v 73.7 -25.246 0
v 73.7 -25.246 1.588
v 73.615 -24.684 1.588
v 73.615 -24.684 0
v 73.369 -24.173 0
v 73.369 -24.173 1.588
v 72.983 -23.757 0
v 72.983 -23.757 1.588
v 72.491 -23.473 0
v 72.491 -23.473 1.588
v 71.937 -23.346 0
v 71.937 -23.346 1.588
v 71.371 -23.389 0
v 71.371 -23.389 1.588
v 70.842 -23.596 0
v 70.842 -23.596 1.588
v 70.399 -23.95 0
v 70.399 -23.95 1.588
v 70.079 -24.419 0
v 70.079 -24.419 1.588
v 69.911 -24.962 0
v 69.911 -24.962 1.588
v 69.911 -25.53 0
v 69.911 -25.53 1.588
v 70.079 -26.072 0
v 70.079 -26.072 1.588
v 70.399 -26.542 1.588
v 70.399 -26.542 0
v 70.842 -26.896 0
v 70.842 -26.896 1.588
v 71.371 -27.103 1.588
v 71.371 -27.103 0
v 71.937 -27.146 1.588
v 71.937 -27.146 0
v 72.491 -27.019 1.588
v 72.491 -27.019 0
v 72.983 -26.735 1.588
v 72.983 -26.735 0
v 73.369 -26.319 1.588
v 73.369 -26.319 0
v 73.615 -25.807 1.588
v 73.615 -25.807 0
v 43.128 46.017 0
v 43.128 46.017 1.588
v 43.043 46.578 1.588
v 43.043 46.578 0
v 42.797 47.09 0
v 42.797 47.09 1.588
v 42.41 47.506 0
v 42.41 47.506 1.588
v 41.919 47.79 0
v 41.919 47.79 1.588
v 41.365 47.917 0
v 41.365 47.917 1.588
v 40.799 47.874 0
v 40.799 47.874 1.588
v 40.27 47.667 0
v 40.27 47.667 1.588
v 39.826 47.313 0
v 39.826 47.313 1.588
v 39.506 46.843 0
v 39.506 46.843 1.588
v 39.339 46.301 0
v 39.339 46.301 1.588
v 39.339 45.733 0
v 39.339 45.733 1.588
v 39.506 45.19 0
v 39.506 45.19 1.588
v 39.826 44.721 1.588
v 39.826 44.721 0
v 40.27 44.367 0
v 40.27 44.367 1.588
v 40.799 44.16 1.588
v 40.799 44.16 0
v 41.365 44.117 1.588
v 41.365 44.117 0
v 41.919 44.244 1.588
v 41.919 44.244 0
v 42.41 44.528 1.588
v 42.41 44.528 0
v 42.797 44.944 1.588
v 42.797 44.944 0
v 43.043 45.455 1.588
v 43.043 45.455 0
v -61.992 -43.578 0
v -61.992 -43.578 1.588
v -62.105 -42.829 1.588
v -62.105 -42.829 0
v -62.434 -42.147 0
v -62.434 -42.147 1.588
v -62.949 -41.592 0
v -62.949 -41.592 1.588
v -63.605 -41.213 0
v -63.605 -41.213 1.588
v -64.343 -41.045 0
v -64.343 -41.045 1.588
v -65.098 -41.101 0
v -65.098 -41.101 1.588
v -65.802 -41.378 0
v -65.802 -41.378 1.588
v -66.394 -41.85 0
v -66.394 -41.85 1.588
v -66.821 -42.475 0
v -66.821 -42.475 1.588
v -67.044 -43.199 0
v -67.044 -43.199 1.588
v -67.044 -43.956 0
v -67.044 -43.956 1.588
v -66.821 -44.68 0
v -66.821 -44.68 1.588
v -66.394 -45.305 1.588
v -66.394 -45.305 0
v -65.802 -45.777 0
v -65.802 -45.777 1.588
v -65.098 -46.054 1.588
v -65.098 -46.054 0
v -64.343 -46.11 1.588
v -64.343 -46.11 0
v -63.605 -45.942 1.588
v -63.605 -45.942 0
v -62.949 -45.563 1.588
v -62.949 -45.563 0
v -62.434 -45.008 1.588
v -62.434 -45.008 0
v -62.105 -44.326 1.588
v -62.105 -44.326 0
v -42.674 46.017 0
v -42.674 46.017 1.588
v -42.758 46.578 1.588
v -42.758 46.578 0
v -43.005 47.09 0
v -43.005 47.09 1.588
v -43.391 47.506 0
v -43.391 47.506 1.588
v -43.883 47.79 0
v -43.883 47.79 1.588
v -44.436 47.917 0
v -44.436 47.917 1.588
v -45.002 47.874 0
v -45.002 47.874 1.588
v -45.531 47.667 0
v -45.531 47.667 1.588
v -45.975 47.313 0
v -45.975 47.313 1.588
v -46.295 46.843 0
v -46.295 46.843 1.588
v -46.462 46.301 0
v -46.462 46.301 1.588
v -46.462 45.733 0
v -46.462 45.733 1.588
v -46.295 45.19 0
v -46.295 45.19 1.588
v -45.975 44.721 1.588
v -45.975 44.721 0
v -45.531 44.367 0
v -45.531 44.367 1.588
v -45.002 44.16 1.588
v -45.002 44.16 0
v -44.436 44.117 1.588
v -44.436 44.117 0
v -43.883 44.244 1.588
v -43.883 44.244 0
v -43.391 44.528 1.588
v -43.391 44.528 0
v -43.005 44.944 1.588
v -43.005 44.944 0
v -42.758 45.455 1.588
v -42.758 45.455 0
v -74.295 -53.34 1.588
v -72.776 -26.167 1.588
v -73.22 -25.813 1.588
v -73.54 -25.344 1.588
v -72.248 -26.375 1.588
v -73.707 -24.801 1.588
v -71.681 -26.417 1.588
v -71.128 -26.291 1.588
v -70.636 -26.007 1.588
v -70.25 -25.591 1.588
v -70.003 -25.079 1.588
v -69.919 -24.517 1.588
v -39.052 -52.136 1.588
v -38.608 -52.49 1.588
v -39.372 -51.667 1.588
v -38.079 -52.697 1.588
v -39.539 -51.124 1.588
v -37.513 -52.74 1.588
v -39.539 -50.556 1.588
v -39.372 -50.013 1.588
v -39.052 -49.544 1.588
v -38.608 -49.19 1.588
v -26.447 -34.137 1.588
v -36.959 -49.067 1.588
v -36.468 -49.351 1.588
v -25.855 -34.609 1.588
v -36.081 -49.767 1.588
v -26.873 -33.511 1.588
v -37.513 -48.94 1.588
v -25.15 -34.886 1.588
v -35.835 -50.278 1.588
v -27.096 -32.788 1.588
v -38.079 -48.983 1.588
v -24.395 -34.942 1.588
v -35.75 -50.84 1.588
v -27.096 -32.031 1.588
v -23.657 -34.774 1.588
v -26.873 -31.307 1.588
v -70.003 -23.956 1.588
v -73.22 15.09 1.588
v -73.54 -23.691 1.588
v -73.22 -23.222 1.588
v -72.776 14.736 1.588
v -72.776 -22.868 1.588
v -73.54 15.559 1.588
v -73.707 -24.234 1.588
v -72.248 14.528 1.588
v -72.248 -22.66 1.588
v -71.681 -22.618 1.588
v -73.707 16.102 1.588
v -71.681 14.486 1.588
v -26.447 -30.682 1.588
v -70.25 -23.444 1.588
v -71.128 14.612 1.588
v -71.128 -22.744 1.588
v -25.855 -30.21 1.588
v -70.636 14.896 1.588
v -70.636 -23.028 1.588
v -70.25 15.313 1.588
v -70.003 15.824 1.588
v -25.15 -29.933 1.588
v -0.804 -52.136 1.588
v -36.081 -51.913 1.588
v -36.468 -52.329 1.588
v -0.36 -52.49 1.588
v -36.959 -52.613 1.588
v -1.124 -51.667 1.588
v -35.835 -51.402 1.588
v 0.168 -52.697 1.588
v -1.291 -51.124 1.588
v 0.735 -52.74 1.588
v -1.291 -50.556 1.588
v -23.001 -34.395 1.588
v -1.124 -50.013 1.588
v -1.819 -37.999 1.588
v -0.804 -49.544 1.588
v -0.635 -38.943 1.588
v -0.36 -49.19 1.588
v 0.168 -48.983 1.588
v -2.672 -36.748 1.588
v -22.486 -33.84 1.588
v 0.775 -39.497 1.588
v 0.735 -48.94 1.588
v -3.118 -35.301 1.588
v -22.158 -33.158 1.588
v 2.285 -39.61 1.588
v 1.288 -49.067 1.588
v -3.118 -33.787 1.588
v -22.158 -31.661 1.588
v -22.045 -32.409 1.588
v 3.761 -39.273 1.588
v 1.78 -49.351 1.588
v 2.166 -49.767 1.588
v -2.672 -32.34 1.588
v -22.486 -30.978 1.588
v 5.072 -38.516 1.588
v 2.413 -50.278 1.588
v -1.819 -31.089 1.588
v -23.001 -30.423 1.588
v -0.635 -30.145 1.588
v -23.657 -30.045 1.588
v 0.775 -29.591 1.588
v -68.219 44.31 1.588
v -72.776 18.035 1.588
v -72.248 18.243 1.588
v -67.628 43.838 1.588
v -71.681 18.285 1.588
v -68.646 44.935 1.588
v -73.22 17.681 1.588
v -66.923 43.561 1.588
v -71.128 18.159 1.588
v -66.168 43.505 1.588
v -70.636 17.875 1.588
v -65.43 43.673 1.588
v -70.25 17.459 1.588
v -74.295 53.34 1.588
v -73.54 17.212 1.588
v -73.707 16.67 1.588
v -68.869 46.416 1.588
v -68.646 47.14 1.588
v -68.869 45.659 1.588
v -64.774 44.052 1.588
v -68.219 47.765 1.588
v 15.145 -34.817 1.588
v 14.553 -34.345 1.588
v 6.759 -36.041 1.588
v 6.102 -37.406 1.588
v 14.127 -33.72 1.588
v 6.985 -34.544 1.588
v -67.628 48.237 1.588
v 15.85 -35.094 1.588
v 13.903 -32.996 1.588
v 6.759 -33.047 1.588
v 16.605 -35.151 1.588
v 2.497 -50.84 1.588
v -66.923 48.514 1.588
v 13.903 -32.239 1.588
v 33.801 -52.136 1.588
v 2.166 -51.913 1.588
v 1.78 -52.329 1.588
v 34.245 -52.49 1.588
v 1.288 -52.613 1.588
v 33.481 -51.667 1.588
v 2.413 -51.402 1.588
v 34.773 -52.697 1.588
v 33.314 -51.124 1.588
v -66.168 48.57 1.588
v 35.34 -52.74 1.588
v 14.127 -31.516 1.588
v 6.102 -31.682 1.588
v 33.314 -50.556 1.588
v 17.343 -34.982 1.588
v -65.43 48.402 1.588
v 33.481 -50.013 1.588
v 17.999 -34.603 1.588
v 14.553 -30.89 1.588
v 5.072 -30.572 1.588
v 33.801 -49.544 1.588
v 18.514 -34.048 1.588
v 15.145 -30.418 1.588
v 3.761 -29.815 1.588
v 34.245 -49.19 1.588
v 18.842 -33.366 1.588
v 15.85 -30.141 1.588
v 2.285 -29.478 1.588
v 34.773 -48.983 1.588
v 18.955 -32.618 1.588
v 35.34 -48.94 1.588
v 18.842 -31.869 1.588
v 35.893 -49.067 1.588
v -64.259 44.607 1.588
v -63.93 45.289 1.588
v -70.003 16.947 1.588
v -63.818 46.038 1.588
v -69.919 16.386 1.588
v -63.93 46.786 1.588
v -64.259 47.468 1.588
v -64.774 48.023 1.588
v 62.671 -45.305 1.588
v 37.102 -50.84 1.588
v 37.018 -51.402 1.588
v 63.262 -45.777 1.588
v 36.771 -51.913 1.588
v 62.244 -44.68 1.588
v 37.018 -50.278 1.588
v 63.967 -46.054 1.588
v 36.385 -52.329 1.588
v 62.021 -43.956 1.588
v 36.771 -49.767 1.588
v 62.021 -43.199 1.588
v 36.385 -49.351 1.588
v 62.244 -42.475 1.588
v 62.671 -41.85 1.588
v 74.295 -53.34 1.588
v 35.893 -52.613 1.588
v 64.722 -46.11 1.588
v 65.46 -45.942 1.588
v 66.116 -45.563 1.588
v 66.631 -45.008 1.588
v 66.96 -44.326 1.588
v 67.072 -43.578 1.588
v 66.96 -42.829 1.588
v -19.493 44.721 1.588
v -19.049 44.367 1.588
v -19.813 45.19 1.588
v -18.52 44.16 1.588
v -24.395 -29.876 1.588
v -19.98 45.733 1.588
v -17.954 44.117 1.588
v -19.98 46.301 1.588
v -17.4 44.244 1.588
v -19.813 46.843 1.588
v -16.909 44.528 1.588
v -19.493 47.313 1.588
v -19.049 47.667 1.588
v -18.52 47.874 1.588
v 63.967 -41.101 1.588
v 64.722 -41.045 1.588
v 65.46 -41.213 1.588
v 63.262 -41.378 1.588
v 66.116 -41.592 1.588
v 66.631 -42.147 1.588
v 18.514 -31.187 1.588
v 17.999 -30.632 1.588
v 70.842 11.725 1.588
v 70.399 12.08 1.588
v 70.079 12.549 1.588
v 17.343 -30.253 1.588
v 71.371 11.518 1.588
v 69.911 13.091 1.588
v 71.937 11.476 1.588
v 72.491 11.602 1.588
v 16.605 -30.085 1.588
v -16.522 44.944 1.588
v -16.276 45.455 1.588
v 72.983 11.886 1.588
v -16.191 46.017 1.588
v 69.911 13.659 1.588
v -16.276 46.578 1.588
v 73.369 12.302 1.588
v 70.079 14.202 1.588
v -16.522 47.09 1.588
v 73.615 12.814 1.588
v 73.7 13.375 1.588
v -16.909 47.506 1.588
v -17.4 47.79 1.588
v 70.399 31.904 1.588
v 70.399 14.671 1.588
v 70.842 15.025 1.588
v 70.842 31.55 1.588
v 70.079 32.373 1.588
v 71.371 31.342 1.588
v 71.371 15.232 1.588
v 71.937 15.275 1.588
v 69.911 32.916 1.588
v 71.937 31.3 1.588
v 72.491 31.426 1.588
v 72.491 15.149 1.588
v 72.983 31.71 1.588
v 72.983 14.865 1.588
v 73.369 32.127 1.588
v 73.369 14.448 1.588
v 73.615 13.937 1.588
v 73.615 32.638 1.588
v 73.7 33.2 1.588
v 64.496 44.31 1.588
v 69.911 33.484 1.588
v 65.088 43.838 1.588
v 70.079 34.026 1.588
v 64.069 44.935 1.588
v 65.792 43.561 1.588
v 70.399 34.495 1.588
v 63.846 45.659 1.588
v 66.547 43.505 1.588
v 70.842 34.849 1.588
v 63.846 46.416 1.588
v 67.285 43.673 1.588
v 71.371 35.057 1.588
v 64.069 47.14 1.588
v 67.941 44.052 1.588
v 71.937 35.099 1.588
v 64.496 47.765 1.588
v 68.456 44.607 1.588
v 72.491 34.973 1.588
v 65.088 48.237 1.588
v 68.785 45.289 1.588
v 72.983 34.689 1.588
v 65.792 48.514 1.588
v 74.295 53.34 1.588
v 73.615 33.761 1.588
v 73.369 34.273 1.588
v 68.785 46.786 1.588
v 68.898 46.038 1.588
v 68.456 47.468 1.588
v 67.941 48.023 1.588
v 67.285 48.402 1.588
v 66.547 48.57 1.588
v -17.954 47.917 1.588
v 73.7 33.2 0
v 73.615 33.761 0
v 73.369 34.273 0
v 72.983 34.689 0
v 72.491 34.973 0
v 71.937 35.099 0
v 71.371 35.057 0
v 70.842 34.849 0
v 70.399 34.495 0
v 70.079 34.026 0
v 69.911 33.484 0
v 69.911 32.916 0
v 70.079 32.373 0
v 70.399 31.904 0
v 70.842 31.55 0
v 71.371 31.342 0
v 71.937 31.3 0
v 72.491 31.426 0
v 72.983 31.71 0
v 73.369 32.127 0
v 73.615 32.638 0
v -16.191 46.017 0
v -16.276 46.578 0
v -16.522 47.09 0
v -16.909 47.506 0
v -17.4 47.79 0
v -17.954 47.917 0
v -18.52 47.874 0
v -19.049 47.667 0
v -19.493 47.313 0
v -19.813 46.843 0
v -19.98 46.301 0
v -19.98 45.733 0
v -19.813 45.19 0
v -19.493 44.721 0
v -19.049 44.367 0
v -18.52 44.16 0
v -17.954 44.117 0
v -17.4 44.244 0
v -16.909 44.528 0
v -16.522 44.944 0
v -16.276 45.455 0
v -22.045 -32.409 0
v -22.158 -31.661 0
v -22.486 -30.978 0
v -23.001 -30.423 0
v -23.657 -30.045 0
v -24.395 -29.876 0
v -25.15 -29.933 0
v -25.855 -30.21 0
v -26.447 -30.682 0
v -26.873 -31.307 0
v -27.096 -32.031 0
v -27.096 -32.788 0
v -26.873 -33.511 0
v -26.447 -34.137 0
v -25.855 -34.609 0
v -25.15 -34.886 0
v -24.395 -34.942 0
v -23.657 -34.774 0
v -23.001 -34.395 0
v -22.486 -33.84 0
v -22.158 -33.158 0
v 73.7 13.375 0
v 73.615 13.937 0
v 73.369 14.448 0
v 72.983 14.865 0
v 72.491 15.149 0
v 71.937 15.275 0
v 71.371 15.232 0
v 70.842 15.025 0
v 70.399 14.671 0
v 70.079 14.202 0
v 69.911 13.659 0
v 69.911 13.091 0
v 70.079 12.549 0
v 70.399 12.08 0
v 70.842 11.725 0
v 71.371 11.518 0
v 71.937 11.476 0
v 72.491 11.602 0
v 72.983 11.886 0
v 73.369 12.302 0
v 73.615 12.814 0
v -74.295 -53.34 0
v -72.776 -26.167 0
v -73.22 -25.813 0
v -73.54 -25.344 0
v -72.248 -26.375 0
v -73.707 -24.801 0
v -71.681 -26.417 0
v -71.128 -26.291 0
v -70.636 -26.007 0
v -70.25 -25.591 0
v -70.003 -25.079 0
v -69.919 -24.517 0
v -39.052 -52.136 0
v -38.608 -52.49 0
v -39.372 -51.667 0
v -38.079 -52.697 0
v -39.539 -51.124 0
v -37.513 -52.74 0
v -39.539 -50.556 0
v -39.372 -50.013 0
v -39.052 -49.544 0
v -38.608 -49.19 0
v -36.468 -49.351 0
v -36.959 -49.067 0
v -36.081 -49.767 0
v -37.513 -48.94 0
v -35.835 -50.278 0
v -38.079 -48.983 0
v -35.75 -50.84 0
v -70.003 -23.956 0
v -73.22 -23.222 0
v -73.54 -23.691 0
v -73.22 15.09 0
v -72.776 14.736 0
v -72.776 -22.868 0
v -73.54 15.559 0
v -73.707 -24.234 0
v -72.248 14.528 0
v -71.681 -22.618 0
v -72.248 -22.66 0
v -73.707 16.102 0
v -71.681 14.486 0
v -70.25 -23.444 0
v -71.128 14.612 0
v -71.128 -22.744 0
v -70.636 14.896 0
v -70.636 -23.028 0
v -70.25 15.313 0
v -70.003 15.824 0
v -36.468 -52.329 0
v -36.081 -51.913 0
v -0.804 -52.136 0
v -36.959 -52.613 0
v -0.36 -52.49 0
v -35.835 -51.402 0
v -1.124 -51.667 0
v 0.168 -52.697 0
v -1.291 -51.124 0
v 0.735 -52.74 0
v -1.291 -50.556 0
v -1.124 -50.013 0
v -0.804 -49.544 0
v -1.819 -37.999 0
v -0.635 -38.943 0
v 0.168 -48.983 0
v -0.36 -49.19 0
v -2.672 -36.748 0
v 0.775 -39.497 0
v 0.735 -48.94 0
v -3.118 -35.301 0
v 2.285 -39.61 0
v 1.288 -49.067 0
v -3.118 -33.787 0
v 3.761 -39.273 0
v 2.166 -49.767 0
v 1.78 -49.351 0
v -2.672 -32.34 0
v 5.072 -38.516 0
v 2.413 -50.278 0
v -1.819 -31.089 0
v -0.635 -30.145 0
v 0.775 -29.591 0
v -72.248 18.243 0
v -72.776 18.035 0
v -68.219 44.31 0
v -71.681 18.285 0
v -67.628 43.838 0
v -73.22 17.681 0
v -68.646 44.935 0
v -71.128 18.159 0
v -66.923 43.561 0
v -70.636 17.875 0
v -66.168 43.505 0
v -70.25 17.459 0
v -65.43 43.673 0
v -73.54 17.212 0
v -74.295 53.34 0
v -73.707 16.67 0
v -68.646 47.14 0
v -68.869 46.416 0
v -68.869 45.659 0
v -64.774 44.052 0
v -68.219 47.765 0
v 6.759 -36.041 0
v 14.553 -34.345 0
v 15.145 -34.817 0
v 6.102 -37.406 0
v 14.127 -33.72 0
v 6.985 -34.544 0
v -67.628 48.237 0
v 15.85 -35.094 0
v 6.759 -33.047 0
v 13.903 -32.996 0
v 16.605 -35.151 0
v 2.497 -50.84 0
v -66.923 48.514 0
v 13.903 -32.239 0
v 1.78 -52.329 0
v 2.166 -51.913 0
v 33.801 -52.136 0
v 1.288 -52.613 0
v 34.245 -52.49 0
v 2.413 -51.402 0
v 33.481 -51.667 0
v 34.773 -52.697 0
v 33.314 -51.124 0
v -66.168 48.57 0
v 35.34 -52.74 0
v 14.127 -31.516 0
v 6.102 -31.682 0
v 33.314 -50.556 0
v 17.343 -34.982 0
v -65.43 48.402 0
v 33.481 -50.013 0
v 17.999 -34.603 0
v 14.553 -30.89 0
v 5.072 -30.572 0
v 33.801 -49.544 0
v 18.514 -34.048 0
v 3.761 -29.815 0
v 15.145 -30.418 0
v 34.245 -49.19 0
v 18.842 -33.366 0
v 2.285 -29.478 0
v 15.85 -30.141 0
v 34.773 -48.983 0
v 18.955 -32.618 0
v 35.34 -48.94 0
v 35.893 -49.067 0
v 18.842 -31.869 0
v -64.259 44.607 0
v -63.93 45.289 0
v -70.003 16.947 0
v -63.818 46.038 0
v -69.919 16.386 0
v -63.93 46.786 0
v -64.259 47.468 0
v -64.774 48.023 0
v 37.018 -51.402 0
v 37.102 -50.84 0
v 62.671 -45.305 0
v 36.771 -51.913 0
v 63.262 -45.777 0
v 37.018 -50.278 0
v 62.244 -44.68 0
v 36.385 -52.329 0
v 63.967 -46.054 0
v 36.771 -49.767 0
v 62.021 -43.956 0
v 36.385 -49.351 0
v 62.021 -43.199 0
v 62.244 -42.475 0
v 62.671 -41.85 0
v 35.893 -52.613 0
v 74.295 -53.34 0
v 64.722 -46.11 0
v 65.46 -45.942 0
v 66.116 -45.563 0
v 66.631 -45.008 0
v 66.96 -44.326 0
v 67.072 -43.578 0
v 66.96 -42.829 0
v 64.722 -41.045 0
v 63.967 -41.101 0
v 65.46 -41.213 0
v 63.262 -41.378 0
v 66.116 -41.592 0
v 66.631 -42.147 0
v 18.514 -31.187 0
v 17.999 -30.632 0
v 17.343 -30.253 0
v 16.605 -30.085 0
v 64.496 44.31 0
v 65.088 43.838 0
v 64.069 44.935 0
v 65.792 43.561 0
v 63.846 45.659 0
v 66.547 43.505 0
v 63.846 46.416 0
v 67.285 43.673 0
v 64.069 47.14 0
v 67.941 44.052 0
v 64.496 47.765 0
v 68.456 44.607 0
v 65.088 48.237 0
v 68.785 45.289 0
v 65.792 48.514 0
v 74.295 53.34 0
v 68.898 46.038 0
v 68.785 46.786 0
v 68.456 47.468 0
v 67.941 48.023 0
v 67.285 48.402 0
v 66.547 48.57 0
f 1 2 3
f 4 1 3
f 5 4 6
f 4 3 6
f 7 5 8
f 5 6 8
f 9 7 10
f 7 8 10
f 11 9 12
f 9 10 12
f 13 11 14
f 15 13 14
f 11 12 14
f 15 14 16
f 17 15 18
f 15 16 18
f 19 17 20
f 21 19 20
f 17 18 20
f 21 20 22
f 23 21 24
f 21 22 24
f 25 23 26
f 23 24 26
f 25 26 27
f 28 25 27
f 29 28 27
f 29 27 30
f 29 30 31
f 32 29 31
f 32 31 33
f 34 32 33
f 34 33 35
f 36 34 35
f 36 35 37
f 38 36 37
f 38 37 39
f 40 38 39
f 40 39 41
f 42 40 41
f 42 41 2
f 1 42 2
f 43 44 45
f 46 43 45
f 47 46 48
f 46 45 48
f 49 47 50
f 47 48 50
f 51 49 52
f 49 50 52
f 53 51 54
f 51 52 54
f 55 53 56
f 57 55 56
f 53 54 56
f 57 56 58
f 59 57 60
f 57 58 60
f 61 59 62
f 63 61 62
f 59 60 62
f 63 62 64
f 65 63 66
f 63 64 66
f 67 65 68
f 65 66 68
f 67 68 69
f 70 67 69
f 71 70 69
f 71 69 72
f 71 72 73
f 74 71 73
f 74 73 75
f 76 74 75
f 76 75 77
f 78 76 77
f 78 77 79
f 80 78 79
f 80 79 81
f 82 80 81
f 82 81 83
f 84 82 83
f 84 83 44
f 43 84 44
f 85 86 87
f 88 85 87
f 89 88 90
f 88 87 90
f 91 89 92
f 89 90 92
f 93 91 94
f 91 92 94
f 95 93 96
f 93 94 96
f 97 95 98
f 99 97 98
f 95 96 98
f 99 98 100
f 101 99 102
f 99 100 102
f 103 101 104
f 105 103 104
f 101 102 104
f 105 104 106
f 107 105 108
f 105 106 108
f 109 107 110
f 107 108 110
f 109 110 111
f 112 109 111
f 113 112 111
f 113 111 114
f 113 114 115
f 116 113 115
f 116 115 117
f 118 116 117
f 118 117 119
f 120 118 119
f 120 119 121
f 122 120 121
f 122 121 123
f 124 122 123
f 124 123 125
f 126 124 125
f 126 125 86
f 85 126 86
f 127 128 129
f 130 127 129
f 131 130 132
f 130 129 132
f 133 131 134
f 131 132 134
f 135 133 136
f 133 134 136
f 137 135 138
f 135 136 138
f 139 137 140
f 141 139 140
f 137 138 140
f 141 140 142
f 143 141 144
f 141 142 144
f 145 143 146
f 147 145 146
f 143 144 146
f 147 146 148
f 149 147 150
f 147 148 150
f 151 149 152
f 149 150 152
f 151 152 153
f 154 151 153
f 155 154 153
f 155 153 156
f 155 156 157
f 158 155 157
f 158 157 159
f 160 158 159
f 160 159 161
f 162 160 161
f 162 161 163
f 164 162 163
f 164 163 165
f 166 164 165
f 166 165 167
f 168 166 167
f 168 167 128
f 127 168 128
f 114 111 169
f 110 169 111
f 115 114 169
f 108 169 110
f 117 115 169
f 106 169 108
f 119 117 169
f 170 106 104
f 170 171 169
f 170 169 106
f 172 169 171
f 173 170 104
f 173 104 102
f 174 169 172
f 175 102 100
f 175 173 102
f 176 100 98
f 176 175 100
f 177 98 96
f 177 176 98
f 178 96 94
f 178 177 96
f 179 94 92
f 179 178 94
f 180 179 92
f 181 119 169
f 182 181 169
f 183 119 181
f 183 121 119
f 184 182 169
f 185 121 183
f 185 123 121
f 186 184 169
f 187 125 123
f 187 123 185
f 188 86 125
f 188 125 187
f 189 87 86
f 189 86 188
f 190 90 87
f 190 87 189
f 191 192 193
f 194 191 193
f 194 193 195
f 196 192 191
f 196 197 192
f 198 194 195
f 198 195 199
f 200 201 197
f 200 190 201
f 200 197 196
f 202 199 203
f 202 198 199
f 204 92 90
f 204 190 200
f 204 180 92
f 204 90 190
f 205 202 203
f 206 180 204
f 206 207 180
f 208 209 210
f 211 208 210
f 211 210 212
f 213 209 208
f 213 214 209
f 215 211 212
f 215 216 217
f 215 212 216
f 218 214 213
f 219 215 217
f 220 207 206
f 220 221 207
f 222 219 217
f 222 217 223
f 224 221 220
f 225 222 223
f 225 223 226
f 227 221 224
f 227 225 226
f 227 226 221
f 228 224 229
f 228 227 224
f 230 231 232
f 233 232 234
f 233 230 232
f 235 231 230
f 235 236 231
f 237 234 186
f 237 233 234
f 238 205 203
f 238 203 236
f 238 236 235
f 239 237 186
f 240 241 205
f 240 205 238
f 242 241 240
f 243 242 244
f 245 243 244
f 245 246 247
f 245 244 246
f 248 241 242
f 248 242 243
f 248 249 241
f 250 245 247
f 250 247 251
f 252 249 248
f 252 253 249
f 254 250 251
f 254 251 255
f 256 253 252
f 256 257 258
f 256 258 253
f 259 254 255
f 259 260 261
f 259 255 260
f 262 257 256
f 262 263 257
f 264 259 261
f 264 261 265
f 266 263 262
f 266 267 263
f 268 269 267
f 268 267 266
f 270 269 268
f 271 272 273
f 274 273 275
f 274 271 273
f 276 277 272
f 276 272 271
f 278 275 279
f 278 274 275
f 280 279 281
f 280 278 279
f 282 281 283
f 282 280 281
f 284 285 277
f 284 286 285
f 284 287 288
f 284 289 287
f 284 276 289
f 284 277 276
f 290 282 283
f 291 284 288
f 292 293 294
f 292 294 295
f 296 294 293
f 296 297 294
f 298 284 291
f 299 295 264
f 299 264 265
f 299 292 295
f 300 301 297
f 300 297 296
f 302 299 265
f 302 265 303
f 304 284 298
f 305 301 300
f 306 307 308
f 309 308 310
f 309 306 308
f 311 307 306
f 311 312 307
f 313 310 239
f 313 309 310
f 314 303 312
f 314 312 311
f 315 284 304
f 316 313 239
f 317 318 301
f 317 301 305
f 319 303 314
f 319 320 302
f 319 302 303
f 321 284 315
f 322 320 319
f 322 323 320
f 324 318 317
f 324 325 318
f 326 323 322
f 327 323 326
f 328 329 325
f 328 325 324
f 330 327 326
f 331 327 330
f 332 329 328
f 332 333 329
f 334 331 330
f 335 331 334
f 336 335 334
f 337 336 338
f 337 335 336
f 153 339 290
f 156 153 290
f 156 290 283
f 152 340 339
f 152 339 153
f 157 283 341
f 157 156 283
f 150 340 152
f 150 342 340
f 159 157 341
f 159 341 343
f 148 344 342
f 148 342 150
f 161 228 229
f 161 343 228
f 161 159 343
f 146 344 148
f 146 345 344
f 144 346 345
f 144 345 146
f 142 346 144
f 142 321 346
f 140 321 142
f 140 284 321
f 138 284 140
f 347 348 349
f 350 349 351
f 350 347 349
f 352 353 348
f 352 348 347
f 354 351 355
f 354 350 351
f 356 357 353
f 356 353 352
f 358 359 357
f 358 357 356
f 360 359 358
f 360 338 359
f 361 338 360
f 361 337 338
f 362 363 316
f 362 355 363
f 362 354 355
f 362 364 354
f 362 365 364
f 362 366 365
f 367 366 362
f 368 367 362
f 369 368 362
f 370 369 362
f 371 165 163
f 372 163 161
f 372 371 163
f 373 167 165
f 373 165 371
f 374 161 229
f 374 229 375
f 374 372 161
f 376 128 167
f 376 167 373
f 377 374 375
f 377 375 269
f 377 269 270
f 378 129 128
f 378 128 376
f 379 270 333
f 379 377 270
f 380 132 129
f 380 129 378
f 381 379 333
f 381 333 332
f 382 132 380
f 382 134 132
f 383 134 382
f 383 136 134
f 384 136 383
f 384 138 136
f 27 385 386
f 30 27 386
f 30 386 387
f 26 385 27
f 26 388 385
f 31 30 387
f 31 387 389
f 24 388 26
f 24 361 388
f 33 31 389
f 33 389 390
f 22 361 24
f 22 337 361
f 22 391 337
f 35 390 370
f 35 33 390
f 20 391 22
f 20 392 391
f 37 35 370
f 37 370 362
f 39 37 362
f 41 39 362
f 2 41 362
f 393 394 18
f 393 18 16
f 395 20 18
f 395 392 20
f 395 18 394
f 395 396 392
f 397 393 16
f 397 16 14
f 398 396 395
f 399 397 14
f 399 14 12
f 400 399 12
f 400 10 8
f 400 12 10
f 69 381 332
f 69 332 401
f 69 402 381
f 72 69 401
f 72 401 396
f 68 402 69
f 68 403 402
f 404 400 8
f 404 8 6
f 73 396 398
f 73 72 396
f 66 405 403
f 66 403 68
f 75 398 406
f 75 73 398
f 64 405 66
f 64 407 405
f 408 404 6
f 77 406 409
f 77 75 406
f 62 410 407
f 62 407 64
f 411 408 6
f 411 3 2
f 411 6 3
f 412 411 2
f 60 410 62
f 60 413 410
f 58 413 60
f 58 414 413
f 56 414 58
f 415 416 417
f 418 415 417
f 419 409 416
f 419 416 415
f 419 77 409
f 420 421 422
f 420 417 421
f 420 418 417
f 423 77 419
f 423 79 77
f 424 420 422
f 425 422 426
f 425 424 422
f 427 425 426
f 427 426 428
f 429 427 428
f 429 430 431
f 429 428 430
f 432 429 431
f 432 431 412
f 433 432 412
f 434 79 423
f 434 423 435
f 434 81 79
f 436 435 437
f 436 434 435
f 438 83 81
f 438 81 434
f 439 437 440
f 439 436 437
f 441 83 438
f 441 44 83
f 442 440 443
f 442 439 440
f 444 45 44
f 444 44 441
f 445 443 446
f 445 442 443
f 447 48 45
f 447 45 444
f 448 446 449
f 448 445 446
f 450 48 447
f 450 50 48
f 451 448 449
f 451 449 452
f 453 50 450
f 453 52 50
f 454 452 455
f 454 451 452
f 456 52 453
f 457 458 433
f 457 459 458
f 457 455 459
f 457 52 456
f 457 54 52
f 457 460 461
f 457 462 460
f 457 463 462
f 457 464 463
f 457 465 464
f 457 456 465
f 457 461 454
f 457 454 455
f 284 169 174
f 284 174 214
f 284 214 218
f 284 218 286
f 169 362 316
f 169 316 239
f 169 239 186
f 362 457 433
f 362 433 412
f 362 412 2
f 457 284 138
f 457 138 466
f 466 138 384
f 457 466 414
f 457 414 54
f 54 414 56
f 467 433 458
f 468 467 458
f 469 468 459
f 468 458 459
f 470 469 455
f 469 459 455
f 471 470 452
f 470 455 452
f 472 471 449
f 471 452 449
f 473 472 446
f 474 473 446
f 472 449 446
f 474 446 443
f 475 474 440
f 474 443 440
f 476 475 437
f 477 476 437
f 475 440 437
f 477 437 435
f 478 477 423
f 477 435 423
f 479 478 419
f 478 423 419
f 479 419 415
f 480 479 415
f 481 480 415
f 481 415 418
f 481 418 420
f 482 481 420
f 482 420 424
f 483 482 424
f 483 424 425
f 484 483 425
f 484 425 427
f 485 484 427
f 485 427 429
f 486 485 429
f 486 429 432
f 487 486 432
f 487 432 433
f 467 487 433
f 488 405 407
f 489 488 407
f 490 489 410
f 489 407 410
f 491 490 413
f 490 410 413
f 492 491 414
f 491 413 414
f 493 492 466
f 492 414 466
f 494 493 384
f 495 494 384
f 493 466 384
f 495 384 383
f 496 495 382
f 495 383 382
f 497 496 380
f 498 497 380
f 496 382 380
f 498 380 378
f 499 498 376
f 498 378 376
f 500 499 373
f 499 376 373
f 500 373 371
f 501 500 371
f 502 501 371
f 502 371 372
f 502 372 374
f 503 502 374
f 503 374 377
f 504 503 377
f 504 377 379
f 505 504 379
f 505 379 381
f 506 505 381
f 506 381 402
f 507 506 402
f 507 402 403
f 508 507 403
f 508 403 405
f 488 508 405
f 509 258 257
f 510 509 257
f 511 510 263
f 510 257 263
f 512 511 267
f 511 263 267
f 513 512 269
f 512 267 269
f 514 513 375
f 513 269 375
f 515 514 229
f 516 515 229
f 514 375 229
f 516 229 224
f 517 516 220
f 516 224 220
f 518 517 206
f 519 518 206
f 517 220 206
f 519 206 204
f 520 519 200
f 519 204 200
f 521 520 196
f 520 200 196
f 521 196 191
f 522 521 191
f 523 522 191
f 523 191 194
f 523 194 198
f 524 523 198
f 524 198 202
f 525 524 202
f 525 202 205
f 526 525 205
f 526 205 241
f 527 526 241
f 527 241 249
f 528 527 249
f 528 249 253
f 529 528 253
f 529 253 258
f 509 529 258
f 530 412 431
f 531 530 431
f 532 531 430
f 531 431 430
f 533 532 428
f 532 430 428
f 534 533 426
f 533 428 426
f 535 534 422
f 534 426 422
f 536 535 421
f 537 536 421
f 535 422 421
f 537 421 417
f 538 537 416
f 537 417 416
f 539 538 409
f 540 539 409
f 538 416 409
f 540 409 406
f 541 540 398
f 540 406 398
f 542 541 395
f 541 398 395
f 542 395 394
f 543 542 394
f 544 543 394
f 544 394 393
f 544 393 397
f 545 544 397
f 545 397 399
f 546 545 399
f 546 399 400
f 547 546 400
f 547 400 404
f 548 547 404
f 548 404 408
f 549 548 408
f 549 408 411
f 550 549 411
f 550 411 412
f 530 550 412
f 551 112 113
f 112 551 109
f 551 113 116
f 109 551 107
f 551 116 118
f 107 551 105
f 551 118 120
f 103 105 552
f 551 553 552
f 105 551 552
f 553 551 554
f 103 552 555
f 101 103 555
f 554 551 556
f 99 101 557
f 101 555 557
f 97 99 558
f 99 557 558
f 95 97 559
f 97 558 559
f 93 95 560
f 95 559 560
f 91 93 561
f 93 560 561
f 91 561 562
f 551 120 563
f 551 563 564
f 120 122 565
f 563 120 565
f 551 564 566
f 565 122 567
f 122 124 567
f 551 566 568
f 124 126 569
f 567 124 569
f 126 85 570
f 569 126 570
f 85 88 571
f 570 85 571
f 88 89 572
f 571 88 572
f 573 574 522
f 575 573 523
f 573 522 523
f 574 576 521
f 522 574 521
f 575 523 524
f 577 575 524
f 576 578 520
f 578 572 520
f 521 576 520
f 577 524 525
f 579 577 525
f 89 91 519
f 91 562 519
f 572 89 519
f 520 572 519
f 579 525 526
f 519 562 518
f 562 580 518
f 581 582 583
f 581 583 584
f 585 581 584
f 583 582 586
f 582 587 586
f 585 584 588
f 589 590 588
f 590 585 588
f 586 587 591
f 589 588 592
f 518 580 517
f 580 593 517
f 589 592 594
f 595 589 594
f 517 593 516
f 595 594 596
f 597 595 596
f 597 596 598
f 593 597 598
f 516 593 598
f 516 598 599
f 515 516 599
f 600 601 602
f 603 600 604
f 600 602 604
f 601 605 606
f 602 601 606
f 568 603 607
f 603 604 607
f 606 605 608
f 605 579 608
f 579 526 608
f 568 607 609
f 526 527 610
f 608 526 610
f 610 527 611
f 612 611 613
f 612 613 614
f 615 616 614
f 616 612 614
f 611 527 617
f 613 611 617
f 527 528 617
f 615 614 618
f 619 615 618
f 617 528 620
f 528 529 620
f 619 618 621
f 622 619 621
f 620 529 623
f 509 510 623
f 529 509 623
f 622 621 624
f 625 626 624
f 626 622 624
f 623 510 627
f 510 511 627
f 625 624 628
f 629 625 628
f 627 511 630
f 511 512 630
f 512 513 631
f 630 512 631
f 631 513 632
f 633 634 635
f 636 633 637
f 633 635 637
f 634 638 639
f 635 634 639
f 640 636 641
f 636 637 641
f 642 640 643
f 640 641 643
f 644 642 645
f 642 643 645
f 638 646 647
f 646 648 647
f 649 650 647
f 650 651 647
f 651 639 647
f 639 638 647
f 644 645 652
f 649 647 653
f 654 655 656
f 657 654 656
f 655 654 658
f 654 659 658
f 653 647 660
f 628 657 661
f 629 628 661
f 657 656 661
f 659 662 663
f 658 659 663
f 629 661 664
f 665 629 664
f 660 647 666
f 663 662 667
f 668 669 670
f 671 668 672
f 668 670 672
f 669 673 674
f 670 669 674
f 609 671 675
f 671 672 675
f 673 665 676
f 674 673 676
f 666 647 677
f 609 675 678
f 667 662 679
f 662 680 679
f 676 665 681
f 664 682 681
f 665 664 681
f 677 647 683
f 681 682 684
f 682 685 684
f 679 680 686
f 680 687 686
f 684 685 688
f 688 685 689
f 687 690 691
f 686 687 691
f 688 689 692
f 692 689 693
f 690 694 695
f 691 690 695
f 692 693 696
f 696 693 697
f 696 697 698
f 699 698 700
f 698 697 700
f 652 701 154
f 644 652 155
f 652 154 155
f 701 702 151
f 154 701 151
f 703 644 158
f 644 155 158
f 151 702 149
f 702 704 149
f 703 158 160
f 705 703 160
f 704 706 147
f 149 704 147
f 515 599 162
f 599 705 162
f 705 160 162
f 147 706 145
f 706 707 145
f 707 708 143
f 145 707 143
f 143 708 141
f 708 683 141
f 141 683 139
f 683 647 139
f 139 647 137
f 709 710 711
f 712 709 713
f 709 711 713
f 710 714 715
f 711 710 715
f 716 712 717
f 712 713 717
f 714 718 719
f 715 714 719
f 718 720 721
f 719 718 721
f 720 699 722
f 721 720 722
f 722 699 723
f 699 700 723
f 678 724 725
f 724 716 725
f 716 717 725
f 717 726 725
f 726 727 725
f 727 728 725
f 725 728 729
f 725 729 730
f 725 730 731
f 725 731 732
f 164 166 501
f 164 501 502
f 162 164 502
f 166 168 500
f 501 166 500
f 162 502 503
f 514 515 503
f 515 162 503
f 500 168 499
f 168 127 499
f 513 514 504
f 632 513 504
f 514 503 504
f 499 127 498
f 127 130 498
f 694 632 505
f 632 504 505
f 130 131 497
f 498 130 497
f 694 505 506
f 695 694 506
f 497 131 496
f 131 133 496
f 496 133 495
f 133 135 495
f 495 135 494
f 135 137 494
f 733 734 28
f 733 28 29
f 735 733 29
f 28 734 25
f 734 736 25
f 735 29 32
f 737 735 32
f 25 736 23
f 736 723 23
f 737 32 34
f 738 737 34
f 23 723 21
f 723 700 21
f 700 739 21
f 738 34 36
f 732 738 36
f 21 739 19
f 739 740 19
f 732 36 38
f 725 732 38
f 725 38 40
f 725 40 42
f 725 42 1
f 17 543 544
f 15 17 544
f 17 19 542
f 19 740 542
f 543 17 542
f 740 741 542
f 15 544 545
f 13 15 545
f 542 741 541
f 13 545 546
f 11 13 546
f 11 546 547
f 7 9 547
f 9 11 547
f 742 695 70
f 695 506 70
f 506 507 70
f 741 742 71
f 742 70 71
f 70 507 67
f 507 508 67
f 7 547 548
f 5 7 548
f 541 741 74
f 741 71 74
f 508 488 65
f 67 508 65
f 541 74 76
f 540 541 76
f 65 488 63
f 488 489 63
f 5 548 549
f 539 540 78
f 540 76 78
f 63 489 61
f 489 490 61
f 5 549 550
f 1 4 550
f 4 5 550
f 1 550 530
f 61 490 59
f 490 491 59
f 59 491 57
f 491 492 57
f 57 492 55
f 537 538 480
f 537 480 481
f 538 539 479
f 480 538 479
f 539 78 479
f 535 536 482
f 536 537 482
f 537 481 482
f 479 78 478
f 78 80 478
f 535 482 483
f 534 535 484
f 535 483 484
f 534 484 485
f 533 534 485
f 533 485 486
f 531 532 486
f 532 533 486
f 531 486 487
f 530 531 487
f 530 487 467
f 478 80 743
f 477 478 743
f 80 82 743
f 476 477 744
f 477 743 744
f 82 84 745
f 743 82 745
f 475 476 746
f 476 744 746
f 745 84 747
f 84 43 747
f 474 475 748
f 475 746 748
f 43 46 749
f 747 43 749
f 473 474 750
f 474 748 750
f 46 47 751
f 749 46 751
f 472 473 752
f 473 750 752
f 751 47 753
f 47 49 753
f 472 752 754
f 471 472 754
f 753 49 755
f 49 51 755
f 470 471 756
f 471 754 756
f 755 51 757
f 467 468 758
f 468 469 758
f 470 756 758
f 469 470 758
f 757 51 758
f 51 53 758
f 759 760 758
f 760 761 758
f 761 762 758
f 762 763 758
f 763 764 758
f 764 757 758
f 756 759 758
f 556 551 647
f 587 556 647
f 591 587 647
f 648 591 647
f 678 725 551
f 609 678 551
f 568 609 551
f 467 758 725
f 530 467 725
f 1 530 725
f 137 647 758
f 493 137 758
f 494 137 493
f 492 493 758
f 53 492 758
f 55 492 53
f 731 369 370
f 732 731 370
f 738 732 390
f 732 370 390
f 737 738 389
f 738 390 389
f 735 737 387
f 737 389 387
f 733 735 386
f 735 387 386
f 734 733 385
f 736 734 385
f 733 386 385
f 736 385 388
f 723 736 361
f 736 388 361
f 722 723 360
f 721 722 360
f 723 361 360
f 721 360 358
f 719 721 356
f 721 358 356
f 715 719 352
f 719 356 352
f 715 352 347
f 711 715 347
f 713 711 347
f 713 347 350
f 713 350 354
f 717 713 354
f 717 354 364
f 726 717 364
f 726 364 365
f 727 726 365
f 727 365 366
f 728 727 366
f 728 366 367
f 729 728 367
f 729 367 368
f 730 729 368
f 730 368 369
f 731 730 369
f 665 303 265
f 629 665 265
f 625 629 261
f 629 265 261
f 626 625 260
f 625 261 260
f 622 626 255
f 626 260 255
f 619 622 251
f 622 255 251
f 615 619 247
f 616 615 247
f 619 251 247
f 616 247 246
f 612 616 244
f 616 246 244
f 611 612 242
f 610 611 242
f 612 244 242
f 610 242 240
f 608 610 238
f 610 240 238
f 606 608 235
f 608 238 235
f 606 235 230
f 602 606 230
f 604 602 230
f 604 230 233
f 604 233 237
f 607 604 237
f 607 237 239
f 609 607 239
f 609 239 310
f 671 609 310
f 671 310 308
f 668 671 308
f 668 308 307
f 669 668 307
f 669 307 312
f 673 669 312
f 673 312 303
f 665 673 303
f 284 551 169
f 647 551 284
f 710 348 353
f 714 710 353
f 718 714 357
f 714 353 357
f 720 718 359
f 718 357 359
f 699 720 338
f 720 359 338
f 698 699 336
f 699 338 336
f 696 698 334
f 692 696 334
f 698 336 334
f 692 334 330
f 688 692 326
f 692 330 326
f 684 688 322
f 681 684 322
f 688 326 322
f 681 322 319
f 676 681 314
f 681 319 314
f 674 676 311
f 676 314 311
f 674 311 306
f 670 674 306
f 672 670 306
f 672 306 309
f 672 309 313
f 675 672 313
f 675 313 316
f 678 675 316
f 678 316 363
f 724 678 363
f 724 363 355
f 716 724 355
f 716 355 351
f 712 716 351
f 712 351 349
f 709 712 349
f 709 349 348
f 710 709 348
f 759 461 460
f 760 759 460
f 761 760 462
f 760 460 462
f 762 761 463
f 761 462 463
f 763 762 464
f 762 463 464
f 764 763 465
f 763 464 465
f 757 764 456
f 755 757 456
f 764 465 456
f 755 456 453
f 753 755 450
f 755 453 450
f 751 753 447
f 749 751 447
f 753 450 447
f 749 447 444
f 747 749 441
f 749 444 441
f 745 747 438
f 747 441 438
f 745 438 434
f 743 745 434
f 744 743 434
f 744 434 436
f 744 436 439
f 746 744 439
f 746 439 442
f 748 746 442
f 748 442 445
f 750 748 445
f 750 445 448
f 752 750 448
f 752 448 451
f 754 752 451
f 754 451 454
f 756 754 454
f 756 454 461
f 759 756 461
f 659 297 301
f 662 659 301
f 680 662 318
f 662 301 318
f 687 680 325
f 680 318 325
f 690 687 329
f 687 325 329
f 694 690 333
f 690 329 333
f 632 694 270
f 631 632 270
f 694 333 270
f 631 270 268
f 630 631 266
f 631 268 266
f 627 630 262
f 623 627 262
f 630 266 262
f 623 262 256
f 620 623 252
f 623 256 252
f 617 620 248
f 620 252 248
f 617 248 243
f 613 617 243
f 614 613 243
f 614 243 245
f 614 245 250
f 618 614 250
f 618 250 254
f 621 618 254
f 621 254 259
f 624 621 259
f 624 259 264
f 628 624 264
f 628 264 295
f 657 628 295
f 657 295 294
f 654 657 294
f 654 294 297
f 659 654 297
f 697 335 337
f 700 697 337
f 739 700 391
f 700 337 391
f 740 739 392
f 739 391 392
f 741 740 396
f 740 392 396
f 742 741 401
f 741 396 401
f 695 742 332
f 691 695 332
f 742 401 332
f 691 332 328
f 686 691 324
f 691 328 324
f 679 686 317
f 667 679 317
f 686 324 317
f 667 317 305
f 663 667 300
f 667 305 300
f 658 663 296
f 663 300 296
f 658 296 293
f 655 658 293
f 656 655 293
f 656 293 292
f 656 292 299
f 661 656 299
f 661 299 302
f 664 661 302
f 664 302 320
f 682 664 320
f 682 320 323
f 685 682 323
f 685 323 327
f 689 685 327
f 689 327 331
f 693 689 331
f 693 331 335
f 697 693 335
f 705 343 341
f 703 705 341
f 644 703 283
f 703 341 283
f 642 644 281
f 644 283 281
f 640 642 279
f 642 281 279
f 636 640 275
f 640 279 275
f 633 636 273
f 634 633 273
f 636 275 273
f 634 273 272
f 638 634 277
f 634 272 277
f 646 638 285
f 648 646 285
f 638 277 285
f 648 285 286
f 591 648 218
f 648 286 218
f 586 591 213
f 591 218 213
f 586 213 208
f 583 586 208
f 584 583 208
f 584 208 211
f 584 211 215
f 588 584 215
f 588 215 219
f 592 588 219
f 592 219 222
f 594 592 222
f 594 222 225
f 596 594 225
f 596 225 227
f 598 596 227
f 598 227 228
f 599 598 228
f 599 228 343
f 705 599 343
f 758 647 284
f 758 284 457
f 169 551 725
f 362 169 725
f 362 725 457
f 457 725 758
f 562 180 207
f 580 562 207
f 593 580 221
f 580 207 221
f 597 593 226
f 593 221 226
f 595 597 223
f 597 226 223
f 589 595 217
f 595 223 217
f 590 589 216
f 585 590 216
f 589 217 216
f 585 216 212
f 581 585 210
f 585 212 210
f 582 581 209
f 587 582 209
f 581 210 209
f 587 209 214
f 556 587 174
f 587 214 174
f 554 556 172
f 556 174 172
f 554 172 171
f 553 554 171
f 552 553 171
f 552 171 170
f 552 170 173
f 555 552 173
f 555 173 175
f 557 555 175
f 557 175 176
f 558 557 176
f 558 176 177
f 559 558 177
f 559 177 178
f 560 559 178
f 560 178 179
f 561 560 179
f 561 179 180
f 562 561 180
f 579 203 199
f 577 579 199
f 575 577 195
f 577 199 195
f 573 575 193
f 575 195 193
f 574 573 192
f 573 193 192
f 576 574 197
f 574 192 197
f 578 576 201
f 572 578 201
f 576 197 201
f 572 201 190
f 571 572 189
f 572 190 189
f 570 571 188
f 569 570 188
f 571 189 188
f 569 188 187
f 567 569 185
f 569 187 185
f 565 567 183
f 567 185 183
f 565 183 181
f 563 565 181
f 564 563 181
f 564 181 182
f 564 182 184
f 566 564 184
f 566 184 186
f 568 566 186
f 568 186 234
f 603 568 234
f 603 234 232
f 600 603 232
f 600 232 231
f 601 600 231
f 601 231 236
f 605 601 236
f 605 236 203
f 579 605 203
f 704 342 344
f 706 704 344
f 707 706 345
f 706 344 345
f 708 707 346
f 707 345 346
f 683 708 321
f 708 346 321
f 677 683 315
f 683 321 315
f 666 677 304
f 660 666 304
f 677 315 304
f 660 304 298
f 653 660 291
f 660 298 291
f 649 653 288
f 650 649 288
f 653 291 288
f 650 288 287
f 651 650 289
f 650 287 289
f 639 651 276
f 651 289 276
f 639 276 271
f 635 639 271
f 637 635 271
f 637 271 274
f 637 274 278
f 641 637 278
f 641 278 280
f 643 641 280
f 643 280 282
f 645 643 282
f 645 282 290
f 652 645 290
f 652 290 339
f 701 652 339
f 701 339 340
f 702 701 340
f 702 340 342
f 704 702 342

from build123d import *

# Parameters (mm, degrees)
SKETCH1_W           = 148.59
SKETCH1_H           = 106.68
BOSS_EXTRUDE1_DEPTH = 1.5875
SKETCH2_R           = 2.54
CUT_EXTRUDE1_DEPTH  = 2.5875
CUT_EXTRUDE2_REACH  = 3.587
SKETCH3_R           = 5.08
CUT_EXTRUDE3_REACH  = 3.587
SKETCH4_R           = 1.905
CUT_EXTRUDE4_REACH  = 3.587
SKETCH5_R           = 2.54


with BuildPart() as part:
    # Sketch1 → Boss-Extrude1 (new body)
    with BuildSketch(Plane.XY):
        Rectangle(SKETCH1_W, SKETCH1_H)
    extrude(amount=BOSS_EXTRUDE1_DEPTH)

    # Sketch2 → Cut-Extrude1 (cut, through all)
    with BuildSketch(Plane.XY.offset(1.5875)):
        with Locations((-64.5325, -43.5775)):
            Circle(SKETCH2_R)
        with Locations((64.5325, -43.5775)):
            Circle(SKETCH2_R)
        with Locations((-66.3575, 46.0375)):
            Circle(SKETCH2_R)
        with Locations((66.3575, 46.0375)):
            Circle(SKETCH2_R)
    extrude(amount=-CUT_EXTRUDE1_DEPTH, mode=Mode.SUBTRACT)

    # Sketch3 → Cut-Extrude2 (cut, up to next)
    with BuildSketch(Plane.XY.offset(1.5875), mode=Mode.PRIVATE) as cut_extrude2_sk1:
        with Locations((1.905, -34.544)):
            Circle(SKETCH3_R)
    cut_extrude2_tool1 = extrude(cut_extrude2_sk1.sketch, amount=-CUT_EXTRUDE2_REACH, mode=Mode.PRIVATE) & part.part
    add(cut_extrude2_tool1.solids().sort_by_distance((1.905, -34.544, 1.5875))[0], mode=Mode.SUBTRACT)

    # Sketch4 → Cut-Extrude3 (cut, up to next)
    with BuildSketch(Plane.XY.offset(1.5875), mode=Mode.PRIVATE) as cut_extrude3_sk1:
        with Locations((-44.578582342, 46.016934616)):
            Circle(SKETCH4_R)
    cut_extrude3_tool1 = extrude(cut_extrude3_sk1.sketch, amount=-CUT_EXTRUDE3_REACH, mode=Mode.PRIVATE) & part.part
    add(cut_extrude3_tool1.solids().sort_by_distance((-44.578582, 46.016935, 1.5875))[0], mode=Mode.SUBTRACT)
    # Sketch4 → Cut-Extrude3 (cut, up to next)
    with BuildSketch(Plane.XY.offset(1.5875), mode=Mode.PRIVATE) as cut_extrude3_sk2:
        with Locations((-18.096274256, 46.016934616)):
            Circle(SKETCH4_R)
    cut_extrude3_tool2 = extrude(cut_extrude3_sk2.sketch, amount=-CUT_EXTRUDE3_REACH, mode=Mode.PRIVATE) & part.part
    add(cut_extrude3_tool2.solids().sort_by_distance((-18.096274, 46.016935, 1.5875))[0], mode=Mode.SUBTRACT)
    # Sketch4 → Cut-Extrude3 (cut, up to next)
    with BuildSketch(Plane.XY.offset(1.5875), mode=Mode.PRIVATE) as cut_extrude3_sk3:
        with Locations((41.222617745, 46.016934616)):
            Circle(SKETCH4_R)
    cut_extrude3_tool3 = extrude(cut_extrude3_sk3.sketch, amount=-CUT_EXTRUDE3_REACH, mode=Mode.PRIVATE) & part.part
    add(cut_extrude3_tool3.solids().sort_by_distance((41.222618, 46.016935, 1.5875))[0], mode=Mode.SUBTRACT)
    # Sketch4 → Cut-Extrude3 (cut, up to next)
    with BuildSketch(Plane.XY.offset(1.5875), mode=Mode.PRIVATE) as cut_extrude3_sk4:
        with Locations((71.795, 33.199680415)):
            Circle(SKETCH4_R)
    cut_extrude3_tool4 = extrude(cut_extrude3_sk4.sketch, amount=-CUT_EXTRUDE3_REACH, mode=Mode.PRIVATE) & part.part
    add(cut_extrude3_tool4.solids().sort_by_distance((71.795, 33.19968, 1.5875))[0], mode=Mode.SUBTRACT)
    # Sketch4 → Cut-Extrude3 (cut, up to next)
    with BuildSketch(Plane.XY.offset(1.5875), mode=Mode.PRIVATE) as cut_extrude3_sk5:
        with Locations((71.795, 13.37524336)):
            Circle(SKETCH4_R)
    cut_extrude3_tool5 = extrude(cut_extrude3_sk5.sketch, amount=-CUT_EXTRUDE3_REACH, mode=Mode.PRIVATE) & part.part
    add(cut_extrude3_tool5.solids().sort_by_distance((71.795, 13.375243, 1.5875))[0], mode=Mode.SUBTRACT)
    # Sketch4 → Cut-Extrude3 (cut, up to next)
    with BuildSketch(Plane.XY.offset(1.5875), mode=Mode.PRIVATE) as cut_extrude3_sk6:
        with Locations((71.795, -25.245906802)):
            Circle(SKETCH4_R)
    cut_extrude3_tool6 = extrude(cut_extrude3_sk6.sketch, amount=-CUT_EXTRUDE3_REACH, mode=Mode.PRIVATE) & part.part
    add(cut_extrude3_tool6.solids().sort_by_distance((71.795, -25.245907, 1.5875))[0], mode=Mode.SUBTRACT)
    # Sketch4 → Cut-Extrude3 (cut, up to next)
    with BuildSketch(Plane.XY.offset(1.5875), mode=Mode.PRIVATE) as cut_extrude3_sk7:
        with Locations((35.197381877, -50.84)):
            Circle(SKETCH4_R)
    cut_extrude3_tool7 = extrude(cut_extrude3_sk7.sketch, amount=-CUT_EXTRUDE3_REACH, mode=Mode.PRIVATE) & part.part
    add(cut_extrude3_tool7.solids().sort_by_distance((35.197382, -50.84, 1.5875))[0], mode=Mode.SUBTRACT)
    # Sketch4 → Cut-Extrude3 (cut, up to next)
    with BuildSketch(Plane.XY.offset(1.5875), mode=Mode.PRIVATE) as cut_extrude3_sk8:
        with Locations((0.59225822, -50.84)):
            Circle(SKETCH4_R)
    cut_extrude3_tool8 = extrude(cut_extrude3_sk8.sketch, amount=-CUT_EXTRUDE3_REACH, mode=Mode.PRIVATE) & part.part
    add(cut_extrude3_tool8.solids().sort_by_distance((0.592258, -50.84, 1.5875))[0], mode=Mode.SUBTRACT)
    # Sketch4 → Cut-Extrude3 (cut, up to next)
    with BuildSketch(Plane.XY.offset(1.5875), mode=Mode.PRIVATE) as cut_extrude3_sk9:
        with Locations((-37.65546217, -50.84)):
            Circle(SKETCH4_R)
    cut_extrude3_tool9 = extrude(cut_extrude3_sk9.sketch, amount=-CUT_EXTRUDE3_REACH, mode=Mode.PRIVATE) & part.part
    add(cut_extrude3_tool9.solids().sort_by_distance((-37.655462, -50.84, 1.5875))[0], mode=Mode.SUBTRACT)
    # Sketch4 → Cut-Extrude3 (cut, up to next)
    with BuildSketch(Plane.XY.offset(1.5875), mode=Mode.PRIVATE) as cut_extrude3_sk10:
        with Locations((-71.823750006, -24.517485795)):
            Circle(SKETCH4_R)
    cut_extrude3_tool10 = extrude(cut_extrude3_sk10.sketch, amount=-CUT_EXTRUDE3_REACH, mode=Mode.PRIVATE) & part.part
    add(cut_extrude3_tool10.solids().sort_by_distance((-71.82375, -24.517486, 1.5875))[0], mode=Mode.SUBTRACT)
    # Sketch4 → Cut-Extrude3 (cut, up to next)
    with BuildSketch(Plane.XY.offset(1.5875), mode=Mode.PRIVATE) as cut_extrude3_sk11:
        with Locations((-71.823750006, 16.385688775)):
            Circle(SKETCH4_R)
    cut_extrude3_tool11 = extrude(cut_extrude3_sk11.sketch, amount=-CUT_EXTRUDE3_REACH, mode=Mode.PRIVATE) & part.part
    add(cut_extrude3_tool11.solids().sort_by_distance((-71.82375, 16.385689, 1.5875))[0], mode=Mode.SUBTRACT)

    # Sketch5 → Cut-Extrude4 (cut, up to next)
    with BuildSketch(Plane.XY.offset(1.5875), mode=Mode.PRIVATE) as cut_extrude4_sk1:
        with Locations((-24.584832927, -32.40931441)):
            Circle(SKETCH5_R)
    cut_extrude4_tool1 = extrude(cut_extrude4_sk1.sketch, amount=-CUT_EXTRUDE4_REACH, mode=Mode.PRIVATE) & part.part
    add(cut_extrude4_tool1.solids().sort_by_distance((-24.584833, -32.409314, 1.5875))[0], mode=Mode.SUBTRACT)
    # Sketch5 → Cut-Extrude4 (cut, up to next)
    with BuildSketch(Plane.XY.offset(1.5875), mode=Mode.PRIVATE) as cut_extrude4_sk2:
        with Locations((16.415053576, -32.617647841)):
            Circle(SKETCH5_R)
    cut_extrude4_tool2 = extrude(cut_extrude4_sk2.sketch, amount=-CUT_EXTRUDE4_REACH, mode=Mode.PRIVATE) & part.part
    add(cut_extrude4_tool2.solids().sort_by_distance((16.415054, -32.617648, 1.5875))[0], mode=Mode.SUBTRACT)


solid = part.part
